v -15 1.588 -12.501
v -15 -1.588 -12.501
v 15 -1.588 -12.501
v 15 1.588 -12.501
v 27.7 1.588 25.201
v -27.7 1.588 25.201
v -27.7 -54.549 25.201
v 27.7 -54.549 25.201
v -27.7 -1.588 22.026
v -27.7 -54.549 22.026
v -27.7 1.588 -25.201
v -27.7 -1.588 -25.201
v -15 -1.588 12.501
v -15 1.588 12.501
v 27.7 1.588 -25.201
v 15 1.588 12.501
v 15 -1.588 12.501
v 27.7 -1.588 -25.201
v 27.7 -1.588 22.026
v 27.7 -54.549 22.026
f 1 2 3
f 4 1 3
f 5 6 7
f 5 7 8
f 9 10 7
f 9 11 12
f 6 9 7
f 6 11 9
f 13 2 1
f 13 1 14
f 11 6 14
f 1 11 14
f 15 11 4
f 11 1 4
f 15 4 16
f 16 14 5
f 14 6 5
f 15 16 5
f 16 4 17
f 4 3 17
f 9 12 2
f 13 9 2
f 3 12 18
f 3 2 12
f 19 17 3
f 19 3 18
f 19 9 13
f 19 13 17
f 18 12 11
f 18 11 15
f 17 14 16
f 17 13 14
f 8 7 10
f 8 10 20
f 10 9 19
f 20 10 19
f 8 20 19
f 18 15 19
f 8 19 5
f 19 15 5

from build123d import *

# Parameters (mm, degrees)
F0_W     = 55.39994
F0_H     = 50.40122
F0_W_2   = 29.99994
F0_H_2   = 25.00122
F1_DEPTH = 1.5875
F2_W     = 55.39994
F2_H     = 3.175
F3_DEPTH = 52.96154


with BuildPart() as f1:
    # F0 (on Front) → F1 (new body, symmetric)
    with BuildSketch(Plane.XZ):
        Rectangle(F0_W, F0_H)
        Rectangle(F0_W_2, F0_H_2, mode=Mode.SUBTRACT)
    extrude(amount=F1_DEPTH, both=True)

    # F2 (on face) → F3 (join)
    with BuildSketch(Plane.XZ.offset(1.5875)):
        with Locations((0, 23.61311)):
            Rectangle(F2_W, F2_H)
    extrude(amount=F3_DEPTH)


solid = f1.part
